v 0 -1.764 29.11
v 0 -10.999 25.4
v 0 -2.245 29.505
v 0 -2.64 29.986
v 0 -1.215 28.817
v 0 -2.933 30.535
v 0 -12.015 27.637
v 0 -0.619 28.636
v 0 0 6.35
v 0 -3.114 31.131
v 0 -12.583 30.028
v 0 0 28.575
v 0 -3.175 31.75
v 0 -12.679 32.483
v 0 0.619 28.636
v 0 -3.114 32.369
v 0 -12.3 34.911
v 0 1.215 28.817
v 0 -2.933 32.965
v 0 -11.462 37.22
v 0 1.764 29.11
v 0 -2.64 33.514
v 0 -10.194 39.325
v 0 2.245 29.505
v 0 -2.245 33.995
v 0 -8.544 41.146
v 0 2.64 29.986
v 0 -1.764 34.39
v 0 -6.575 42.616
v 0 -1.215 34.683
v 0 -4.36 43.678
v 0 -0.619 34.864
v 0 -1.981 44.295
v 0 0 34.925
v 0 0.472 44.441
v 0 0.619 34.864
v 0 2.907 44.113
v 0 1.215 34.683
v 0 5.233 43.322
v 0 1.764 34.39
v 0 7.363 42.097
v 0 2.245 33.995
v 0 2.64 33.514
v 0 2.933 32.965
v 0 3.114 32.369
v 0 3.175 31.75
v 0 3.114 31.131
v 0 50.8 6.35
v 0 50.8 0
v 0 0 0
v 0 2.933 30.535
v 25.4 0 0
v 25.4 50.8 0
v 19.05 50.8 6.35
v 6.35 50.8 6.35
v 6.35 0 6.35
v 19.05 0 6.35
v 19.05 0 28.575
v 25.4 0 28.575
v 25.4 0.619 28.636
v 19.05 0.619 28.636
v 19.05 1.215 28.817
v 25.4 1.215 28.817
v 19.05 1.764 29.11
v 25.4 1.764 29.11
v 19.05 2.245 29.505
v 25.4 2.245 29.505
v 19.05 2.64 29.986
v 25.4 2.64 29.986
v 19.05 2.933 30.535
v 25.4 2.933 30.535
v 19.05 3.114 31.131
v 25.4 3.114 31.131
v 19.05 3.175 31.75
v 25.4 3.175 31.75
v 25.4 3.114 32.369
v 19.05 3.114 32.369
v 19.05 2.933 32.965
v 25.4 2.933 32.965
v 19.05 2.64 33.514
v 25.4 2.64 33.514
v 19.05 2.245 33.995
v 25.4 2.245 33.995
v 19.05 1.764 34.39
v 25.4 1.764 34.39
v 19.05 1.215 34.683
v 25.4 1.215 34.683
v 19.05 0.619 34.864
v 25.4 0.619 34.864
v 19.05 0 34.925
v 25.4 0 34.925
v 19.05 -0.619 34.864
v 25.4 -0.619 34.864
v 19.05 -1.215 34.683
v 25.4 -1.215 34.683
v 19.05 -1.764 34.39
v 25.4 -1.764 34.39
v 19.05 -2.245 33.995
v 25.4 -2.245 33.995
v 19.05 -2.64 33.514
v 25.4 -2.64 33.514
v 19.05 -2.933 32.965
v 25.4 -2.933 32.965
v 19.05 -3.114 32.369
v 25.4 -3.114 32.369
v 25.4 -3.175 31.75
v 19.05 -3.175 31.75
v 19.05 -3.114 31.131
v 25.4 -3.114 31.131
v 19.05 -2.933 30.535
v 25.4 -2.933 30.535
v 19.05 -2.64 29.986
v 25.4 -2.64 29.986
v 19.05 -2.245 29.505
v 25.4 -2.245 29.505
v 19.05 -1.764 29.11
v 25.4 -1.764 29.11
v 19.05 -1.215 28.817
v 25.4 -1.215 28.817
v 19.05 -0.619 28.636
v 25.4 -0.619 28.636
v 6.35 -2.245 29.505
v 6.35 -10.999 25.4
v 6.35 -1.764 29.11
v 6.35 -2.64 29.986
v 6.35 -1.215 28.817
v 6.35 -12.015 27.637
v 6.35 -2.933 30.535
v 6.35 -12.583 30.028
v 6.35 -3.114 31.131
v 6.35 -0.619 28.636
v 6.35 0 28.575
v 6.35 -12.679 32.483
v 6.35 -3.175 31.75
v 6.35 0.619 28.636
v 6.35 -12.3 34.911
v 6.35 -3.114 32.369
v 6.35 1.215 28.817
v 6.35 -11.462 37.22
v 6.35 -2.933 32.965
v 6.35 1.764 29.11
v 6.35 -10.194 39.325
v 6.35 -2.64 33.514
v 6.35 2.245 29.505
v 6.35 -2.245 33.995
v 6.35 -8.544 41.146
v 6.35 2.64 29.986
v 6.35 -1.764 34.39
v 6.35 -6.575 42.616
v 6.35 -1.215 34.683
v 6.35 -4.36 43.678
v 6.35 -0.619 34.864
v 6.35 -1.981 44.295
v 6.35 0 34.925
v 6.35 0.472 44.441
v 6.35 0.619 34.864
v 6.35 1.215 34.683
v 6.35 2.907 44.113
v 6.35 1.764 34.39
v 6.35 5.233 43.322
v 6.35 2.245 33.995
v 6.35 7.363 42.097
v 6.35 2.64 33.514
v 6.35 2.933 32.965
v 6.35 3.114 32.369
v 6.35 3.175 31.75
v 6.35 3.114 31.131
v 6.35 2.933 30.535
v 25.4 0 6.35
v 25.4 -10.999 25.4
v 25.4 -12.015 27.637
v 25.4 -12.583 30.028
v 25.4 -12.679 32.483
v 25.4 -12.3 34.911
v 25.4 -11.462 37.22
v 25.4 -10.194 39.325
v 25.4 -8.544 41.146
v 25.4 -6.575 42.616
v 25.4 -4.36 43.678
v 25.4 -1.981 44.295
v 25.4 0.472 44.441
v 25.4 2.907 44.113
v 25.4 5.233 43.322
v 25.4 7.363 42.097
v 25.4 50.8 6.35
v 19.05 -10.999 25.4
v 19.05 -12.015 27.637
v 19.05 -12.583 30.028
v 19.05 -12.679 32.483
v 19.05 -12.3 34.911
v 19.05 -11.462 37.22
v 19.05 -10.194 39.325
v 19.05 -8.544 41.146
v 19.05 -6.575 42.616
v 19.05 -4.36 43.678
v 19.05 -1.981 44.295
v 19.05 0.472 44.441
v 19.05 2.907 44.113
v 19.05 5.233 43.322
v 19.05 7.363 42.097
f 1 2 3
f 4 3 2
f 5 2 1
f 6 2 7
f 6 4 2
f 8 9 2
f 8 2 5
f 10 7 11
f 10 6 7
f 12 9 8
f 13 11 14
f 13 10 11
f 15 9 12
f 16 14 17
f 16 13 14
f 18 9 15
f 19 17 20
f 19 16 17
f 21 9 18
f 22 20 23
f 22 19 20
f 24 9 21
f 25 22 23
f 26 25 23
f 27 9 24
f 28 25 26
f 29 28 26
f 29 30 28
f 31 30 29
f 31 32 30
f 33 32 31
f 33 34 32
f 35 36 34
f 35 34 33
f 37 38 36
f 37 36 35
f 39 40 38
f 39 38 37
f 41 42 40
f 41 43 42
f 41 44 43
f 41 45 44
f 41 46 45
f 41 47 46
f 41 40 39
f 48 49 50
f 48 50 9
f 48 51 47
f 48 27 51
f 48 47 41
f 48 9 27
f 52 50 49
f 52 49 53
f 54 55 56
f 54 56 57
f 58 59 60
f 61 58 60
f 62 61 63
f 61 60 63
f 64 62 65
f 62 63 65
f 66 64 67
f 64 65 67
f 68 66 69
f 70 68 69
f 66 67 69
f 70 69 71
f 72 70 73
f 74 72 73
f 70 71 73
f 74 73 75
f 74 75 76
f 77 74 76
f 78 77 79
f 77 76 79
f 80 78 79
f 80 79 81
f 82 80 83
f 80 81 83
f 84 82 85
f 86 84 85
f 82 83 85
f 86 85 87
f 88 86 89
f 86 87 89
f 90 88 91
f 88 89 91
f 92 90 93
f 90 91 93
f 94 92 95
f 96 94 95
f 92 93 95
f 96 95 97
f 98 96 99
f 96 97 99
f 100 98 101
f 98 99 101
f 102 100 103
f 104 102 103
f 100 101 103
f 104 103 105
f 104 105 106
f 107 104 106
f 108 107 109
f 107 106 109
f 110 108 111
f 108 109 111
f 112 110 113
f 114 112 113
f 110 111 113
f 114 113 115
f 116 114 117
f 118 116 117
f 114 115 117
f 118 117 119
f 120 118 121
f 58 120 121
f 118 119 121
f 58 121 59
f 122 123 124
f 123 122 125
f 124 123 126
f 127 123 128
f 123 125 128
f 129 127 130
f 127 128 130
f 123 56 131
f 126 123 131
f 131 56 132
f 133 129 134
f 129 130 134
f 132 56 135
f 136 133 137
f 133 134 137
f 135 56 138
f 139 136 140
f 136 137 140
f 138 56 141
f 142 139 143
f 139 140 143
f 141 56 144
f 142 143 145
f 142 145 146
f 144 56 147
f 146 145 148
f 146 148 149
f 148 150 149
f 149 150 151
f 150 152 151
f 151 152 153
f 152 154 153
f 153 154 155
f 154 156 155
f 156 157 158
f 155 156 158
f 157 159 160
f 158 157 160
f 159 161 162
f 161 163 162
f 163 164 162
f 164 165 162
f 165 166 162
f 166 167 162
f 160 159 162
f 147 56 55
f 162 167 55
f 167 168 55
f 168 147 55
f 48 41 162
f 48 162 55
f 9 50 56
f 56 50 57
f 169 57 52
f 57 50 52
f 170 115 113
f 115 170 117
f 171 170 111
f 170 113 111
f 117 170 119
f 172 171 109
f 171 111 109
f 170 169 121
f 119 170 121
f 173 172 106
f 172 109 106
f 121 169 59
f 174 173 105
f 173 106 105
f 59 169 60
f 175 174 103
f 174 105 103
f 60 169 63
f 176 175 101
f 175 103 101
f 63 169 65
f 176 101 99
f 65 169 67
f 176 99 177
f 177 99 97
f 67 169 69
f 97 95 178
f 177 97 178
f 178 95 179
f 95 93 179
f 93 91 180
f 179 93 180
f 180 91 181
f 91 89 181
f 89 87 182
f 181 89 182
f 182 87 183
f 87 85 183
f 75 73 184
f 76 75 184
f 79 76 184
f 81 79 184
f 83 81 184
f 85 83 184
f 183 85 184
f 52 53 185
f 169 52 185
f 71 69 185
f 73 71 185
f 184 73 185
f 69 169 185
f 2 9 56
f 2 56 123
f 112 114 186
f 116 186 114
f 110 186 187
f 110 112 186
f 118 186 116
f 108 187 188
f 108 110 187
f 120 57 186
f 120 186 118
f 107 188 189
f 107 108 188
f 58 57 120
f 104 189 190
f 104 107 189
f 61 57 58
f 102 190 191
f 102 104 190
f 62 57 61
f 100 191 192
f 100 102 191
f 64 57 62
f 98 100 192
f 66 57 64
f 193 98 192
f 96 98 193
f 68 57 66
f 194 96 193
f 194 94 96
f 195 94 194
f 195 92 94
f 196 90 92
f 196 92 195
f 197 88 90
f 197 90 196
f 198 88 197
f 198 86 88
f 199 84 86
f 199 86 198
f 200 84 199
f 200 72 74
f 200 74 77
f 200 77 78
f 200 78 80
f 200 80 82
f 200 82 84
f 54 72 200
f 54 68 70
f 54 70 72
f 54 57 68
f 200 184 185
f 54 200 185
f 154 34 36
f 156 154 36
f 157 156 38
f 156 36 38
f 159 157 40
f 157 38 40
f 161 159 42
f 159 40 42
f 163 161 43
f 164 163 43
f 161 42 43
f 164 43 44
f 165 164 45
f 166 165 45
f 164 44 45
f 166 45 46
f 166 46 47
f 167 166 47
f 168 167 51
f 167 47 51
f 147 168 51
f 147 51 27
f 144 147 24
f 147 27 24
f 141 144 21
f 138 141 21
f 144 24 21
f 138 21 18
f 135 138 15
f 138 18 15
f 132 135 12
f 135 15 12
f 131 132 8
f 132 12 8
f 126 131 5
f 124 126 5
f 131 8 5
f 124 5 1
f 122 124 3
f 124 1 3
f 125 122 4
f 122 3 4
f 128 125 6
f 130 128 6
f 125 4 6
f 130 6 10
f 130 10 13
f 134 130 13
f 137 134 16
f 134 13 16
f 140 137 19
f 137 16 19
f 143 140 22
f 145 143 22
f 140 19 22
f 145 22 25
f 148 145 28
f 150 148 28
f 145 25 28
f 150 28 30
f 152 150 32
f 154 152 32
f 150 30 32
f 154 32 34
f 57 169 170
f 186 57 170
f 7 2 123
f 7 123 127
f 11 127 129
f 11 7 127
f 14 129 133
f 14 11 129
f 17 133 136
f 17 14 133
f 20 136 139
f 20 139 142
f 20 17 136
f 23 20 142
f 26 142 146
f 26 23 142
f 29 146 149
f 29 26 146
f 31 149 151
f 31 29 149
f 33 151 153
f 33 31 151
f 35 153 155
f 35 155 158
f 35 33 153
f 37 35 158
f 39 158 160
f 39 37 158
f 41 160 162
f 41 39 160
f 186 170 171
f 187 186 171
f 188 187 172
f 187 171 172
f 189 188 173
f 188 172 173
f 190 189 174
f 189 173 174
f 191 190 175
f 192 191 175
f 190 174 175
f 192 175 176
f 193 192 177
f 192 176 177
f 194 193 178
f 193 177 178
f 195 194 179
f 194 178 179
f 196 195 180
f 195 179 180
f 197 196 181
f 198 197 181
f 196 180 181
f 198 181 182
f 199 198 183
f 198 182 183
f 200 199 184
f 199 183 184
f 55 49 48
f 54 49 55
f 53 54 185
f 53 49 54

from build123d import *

# Parameters (mm, degrees)
SKETCH1_W           = 25.4
SKETCH1_H           = 50.8
BOSS_EXTRUDE1_DEPTH = 6.35
SKETCH2_R           = 3.175
BOSS_EXTRUDE2_DEPTH = 6.35
SKETCH3_R           = 3.175
BOSS_EXTRUDE3_DEPTH = 6.35


with BuildPart() as part:
    # Sketch1 → Boss-Extrude1 (new body)
    with BuildSketch(Plane.XY):
        with Locations((12.7, 25.4)):
            Rectangle(SKETCH1_W, SKETCH1_H)
    extrude(amount=BOSS_EXTRUDE1_DEPTH)

    # Sketch2 → Boss-Extrude2 (add)
    with BuildSketch(Plane(origin=(25.4, 0, 0), x_dir=(0, 0, -1), z_dir=(1, 0, 0))):
        with BuildLine():
            Line((-6.35, 0), (-25.4, -10.998522628))
            ThreePointArc((-25.4, -10.998522628), (-41.146035344, -8.544268244), (-42.097436971, 7.363460336))
            Line((-42.097436971, 7.363460336), (-6.35, 50.8))
            Line((-6.35, 50.8), (-6.35, 0))
        make_face()
        with Locations((-31.75, 0)):
            Circle(SKETCH2_R, mode=Mode.SUBTRACT)
    extrude(amount=-BOSS_EXTRUDE2_DEPTH)

    # Sketch3 → Boss-Extrude3 (add)
    with BuildSketch(Plane.ZY):
        with BuildLine():
            Line((6.35, 0), (25.4, -10.998522628))
            ThreePointArc((25.4, -10.998522628), (41.146035344, -8.544268244), (42.097436971, 7.363460336))
            Line((42.097436971, 7.363460336), (6.35, 50.8))
            Line((6.35, 50.8), (6.35, 0))
        make_face()
        with Locations((31.75, 0)):
            Circle(SKETCH3_R, mode=Mode.SUBTRACT)
    extrude(amount=-BOSS_EXTRUDE3_DEPTH)


solid = part.part
